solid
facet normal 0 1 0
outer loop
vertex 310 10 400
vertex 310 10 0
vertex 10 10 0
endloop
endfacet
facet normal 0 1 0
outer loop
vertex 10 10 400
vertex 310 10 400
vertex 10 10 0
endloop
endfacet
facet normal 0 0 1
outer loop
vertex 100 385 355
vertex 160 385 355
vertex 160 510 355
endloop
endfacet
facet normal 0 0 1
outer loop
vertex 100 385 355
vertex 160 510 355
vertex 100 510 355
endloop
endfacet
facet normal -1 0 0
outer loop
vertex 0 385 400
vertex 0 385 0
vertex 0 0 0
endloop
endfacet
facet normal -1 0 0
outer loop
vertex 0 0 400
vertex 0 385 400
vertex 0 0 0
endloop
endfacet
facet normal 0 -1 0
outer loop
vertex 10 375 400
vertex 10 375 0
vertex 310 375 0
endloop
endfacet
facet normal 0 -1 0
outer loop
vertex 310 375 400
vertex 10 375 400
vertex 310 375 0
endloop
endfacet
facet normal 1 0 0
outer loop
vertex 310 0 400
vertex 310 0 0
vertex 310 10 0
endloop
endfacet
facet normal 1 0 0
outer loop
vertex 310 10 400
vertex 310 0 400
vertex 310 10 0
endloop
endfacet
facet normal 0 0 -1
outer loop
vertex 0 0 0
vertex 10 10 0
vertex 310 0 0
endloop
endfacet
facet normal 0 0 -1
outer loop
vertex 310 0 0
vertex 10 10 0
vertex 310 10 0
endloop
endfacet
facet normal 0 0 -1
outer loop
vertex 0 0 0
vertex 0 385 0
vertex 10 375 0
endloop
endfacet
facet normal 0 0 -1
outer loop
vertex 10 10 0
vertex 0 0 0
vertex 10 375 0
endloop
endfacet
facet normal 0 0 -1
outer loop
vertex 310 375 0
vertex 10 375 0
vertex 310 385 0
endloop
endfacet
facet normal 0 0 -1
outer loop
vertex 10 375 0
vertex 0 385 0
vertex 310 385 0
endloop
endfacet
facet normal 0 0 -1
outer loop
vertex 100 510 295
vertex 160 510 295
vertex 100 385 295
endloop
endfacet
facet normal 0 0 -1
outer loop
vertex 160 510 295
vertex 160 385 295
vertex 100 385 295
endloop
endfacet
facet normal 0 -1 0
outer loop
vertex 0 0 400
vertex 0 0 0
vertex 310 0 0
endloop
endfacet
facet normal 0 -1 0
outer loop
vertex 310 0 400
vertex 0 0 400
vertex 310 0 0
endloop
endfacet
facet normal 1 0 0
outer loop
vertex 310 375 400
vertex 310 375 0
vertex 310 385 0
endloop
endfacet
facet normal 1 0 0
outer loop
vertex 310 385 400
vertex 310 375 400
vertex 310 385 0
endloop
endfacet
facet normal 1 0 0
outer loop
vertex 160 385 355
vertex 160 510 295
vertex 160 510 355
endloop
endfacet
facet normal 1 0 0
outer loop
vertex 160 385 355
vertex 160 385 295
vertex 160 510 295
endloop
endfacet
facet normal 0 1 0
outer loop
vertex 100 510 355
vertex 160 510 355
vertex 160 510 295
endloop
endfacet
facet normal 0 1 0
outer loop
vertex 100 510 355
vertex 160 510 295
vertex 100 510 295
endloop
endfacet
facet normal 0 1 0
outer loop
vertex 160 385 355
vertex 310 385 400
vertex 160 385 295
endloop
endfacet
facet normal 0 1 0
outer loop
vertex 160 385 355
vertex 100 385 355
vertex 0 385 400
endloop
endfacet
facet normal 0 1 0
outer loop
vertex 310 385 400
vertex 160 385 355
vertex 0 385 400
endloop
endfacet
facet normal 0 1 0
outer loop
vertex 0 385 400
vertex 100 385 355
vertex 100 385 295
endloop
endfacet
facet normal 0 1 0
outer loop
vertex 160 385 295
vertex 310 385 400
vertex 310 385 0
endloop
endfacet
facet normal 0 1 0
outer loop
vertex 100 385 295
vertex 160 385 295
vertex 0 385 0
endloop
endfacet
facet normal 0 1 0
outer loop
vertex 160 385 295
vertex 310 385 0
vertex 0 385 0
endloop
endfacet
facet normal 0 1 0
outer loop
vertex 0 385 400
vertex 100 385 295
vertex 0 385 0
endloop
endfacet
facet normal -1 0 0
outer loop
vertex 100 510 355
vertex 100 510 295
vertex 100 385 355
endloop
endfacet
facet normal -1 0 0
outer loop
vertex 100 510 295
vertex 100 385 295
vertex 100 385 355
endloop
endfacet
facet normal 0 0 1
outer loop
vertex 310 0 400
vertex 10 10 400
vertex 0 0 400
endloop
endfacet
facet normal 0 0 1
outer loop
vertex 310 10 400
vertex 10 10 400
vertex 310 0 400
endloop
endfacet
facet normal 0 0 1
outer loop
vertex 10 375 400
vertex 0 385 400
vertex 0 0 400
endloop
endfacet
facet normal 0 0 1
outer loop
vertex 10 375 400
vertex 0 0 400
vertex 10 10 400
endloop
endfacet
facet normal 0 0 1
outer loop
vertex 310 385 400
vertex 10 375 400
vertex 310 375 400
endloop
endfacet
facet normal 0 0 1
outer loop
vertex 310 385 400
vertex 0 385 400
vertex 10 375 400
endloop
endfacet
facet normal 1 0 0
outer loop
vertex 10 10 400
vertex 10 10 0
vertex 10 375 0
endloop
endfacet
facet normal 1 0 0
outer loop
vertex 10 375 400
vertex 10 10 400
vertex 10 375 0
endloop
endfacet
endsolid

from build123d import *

# Parameters (mm, degrees)
F1_DEPTH  = 400
F2_W      = 60
F2_H      = 60
F3_DEPTH  = 25
F3_FACE_W = 60
F3_FACE_H = 60
F4_DEPTH  = 100


with BuildPart() as f1:
    # F0 (on Top) → F1 (new body)
    with BuildSketch(Plane.XY):
        Polygon((0, 385), (0, 0), (310, 0), (310, 10), (10, 10), (10, 375), (310, 375), (310, 385), align=None)
    extrude(amount=F1_DEPTH)

    # F2 (on face) → F3 (join)
    with BuildSketch(Plane(origin=(0, 385, 0), x_dir=(-1, 0, 0), z_dir=(0, 1, 0))):
        with Locations((-130, 325)):
            Rectangle(F2_W, F2_H)
    extrude(amount=F3_DEPTH)

    # F3_face (on face) → F4 (join)
    with BuildSketch(Plane(origin=(130, 410, 325), x_dir=(-1, 0, 0), z_dir=(0, 1, 0))):
        Rectangle(F3_FACE_W, F3_FACE_H)
    extrude(amount=F4_DEPTH)


solid = f1.part
